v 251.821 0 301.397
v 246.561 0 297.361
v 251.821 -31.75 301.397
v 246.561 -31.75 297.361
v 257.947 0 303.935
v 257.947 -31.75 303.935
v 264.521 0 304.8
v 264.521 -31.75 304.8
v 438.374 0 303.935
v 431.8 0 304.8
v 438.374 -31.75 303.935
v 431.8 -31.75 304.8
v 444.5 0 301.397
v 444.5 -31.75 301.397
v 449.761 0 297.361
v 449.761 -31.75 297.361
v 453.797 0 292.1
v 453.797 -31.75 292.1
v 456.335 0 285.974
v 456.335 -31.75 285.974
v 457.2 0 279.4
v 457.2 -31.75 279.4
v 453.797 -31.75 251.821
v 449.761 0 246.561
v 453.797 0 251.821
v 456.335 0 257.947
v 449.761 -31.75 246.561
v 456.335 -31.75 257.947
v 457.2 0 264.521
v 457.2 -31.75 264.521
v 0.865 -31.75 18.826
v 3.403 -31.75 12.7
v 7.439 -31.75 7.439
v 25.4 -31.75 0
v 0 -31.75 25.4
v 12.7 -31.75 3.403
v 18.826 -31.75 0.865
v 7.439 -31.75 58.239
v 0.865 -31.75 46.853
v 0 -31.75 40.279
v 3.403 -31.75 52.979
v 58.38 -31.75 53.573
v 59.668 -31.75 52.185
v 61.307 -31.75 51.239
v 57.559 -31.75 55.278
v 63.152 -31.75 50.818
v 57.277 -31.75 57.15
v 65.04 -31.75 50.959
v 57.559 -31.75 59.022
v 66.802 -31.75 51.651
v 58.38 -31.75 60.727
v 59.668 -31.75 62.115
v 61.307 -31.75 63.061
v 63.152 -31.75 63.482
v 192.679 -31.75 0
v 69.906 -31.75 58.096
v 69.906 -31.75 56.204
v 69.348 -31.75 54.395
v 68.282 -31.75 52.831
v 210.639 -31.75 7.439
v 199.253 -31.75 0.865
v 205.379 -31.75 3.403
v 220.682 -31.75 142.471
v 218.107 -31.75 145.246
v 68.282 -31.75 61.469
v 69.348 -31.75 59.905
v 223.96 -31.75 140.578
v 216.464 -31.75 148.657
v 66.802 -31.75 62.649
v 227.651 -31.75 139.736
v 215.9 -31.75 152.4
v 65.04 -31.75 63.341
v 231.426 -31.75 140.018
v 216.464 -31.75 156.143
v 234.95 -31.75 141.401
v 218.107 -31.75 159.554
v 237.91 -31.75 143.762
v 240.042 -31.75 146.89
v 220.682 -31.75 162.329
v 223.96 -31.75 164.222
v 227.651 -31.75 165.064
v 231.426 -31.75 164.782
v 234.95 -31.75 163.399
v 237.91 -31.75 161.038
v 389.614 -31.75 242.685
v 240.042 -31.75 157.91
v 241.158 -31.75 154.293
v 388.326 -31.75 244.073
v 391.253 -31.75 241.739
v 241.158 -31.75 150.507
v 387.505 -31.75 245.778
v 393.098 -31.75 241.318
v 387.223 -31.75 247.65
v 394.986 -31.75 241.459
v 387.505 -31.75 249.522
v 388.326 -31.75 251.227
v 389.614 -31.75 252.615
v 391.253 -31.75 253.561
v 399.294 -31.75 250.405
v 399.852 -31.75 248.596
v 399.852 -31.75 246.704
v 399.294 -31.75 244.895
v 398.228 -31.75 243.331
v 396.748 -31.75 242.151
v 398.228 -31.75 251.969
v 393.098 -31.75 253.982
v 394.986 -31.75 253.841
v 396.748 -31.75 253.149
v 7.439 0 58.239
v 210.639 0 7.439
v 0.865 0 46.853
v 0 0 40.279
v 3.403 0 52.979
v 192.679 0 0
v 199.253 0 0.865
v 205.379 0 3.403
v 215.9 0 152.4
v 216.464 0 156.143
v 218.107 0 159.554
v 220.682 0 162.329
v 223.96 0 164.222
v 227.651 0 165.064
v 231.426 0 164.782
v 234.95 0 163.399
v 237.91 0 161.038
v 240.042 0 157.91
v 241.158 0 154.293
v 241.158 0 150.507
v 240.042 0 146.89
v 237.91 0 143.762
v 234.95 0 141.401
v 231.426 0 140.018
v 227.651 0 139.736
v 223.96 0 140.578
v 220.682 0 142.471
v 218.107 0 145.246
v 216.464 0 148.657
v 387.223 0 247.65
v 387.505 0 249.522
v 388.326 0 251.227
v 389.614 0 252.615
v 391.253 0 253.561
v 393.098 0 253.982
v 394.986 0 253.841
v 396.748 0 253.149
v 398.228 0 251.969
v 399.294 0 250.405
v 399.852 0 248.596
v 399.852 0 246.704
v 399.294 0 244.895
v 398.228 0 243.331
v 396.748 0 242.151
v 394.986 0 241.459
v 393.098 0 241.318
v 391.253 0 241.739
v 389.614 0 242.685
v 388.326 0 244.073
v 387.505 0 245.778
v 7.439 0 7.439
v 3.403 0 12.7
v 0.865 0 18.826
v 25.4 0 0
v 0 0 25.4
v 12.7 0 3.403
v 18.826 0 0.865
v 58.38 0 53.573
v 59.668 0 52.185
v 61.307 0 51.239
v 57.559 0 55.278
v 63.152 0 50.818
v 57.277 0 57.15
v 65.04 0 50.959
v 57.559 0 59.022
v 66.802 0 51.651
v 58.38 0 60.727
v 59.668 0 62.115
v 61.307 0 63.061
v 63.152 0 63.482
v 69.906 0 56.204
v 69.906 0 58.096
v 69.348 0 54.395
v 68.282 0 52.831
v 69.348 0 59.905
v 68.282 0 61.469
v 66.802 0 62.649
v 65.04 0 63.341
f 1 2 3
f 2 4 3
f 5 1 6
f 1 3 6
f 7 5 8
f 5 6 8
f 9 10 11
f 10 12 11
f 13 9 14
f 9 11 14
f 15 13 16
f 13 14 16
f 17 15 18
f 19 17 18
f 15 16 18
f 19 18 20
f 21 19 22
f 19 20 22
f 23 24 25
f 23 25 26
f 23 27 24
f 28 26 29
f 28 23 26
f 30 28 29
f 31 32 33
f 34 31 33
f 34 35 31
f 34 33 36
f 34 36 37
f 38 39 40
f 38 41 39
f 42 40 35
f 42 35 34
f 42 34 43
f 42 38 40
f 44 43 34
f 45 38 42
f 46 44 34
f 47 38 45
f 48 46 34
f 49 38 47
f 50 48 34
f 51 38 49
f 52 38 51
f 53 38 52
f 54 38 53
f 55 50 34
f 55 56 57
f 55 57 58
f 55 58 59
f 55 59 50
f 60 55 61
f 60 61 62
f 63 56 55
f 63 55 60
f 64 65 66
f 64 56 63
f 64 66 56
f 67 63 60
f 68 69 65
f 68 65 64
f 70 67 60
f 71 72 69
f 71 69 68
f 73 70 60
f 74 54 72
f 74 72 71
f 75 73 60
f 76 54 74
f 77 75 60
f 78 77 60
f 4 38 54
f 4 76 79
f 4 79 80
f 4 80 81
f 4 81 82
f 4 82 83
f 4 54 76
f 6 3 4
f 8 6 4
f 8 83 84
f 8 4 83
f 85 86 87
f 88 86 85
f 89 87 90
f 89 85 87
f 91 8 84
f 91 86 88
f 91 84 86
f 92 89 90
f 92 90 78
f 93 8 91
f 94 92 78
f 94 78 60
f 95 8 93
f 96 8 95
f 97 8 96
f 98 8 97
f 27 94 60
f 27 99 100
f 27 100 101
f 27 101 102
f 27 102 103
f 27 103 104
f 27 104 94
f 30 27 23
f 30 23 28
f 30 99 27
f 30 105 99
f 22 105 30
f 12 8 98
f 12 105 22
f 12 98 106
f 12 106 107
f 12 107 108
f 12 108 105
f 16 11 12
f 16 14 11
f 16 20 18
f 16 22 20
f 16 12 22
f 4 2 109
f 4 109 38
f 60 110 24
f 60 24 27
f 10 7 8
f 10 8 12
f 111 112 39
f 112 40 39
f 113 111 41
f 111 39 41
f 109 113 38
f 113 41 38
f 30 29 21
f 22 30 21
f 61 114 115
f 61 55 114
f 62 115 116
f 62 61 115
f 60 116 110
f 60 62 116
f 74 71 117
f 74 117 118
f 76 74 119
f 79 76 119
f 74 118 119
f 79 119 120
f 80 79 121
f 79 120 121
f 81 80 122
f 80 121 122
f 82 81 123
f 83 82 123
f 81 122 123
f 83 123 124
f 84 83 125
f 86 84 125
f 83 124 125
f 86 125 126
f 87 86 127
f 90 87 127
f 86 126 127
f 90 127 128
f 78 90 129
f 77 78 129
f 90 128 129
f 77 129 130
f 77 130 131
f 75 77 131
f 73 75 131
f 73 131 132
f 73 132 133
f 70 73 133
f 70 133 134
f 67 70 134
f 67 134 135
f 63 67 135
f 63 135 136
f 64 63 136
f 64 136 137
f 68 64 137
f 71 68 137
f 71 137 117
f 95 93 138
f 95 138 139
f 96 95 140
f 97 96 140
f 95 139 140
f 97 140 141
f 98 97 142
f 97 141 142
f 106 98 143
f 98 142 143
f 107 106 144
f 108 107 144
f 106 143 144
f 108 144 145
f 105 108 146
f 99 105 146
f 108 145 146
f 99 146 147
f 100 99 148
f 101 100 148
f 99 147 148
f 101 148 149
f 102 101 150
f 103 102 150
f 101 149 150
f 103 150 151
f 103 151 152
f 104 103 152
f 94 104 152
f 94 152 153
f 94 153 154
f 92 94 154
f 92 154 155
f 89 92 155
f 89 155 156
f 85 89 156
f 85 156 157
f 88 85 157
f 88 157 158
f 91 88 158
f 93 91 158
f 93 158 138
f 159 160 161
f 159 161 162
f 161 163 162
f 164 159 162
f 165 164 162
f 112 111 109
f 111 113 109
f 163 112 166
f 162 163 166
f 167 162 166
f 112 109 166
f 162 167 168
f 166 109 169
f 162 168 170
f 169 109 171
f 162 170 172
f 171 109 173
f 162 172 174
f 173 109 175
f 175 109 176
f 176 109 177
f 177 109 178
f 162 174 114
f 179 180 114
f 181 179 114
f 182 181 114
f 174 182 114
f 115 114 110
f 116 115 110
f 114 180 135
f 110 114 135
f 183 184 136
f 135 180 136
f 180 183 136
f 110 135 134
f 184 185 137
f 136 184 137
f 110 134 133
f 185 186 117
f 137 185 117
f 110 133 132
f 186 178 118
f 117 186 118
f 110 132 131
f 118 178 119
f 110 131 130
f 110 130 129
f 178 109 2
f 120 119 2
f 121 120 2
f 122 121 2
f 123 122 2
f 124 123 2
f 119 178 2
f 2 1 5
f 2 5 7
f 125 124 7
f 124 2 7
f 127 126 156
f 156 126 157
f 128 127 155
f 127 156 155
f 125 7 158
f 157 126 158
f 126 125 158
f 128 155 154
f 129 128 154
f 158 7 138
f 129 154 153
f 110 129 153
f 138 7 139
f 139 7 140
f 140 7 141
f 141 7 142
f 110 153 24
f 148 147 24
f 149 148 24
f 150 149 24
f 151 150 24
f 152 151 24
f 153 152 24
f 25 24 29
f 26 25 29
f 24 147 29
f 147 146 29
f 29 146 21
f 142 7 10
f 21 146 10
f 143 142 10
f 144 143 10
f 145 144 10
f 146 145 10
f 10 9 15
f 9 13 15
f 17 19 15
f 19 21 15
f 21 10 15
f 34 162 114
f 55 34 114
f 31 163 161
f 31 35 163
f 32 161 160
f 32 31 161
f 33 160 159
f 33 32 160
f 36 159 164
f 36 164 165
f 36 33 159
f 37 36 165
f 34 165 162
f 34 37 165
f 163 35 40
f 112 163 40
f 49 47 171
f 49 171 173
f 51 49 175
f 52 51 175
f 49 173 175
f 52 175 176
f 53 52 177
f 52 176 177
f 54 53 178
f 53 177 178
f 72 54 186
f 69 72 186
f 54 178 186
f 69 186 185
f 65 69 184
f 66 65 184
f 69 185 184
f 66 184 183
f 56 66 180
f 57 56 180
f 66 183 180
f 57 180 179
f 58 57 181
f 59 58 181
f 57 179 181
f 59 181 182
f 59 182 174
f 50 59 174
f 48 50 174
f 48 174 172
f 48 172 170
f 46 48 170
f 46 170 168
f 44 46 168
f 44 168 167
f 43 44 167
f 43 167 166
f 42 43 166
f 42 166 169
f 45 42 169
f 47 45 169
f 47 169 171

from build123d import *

# Parameters (mm, degrees)
F0_W     = 457.2
F0_H     = 304.8
F1_DEPTH = 31.75
F2_SIZE2 = 254
F2_SIZE  = 254
F3_R     = 25.4
F5_D     = 12.7
F8_D     = 25.4


with BuildPart() as f1:
    # F0 (on Front) → F1 (new body)
    with BuildSketch(Plane.XZ):
        with Locations((228.6, 152.4)):
            Rectangle(F0_W, F0_H)
    extrude(amount=F1_DEPTH)

    # F2
    f2_edges = [f1.edges().sort_by_distance(p)[0] for p in [
        (0, -15.875, 304.8),
        (457.2, -15.875, 0),
    ]]
    chamfer(f2_edges, length=F2_SIZE, length2=F2_SIZE2)

    # F3
    f3_edges = [f1.edges().sort_by_distance(p)[0] for p in [
        (0, -15.875, 50.8),
        (0, -15.875, 0),
        (203.2, -15.875, 0),
        (457.2, -15.875, 254),
        (457.2, -15.875, 304.8),
        (254, -15.875, 304.8),
    ]]
    fillet(f3_edges, radius=F3_R)

    # F5 (through all)
    with Locations(Plane.XZ.offset(31.75)):
        with Locations((63.627, 57.15), (393.573, 247.65)):
            Hole(F5_D / 2)

    # F8 (through all)
    with Locations(Plane.XZ.offset(31.75)):
        with Locations((228.6, 152.4)):
            Hole(F8_D / 2)


solid = f1.part
